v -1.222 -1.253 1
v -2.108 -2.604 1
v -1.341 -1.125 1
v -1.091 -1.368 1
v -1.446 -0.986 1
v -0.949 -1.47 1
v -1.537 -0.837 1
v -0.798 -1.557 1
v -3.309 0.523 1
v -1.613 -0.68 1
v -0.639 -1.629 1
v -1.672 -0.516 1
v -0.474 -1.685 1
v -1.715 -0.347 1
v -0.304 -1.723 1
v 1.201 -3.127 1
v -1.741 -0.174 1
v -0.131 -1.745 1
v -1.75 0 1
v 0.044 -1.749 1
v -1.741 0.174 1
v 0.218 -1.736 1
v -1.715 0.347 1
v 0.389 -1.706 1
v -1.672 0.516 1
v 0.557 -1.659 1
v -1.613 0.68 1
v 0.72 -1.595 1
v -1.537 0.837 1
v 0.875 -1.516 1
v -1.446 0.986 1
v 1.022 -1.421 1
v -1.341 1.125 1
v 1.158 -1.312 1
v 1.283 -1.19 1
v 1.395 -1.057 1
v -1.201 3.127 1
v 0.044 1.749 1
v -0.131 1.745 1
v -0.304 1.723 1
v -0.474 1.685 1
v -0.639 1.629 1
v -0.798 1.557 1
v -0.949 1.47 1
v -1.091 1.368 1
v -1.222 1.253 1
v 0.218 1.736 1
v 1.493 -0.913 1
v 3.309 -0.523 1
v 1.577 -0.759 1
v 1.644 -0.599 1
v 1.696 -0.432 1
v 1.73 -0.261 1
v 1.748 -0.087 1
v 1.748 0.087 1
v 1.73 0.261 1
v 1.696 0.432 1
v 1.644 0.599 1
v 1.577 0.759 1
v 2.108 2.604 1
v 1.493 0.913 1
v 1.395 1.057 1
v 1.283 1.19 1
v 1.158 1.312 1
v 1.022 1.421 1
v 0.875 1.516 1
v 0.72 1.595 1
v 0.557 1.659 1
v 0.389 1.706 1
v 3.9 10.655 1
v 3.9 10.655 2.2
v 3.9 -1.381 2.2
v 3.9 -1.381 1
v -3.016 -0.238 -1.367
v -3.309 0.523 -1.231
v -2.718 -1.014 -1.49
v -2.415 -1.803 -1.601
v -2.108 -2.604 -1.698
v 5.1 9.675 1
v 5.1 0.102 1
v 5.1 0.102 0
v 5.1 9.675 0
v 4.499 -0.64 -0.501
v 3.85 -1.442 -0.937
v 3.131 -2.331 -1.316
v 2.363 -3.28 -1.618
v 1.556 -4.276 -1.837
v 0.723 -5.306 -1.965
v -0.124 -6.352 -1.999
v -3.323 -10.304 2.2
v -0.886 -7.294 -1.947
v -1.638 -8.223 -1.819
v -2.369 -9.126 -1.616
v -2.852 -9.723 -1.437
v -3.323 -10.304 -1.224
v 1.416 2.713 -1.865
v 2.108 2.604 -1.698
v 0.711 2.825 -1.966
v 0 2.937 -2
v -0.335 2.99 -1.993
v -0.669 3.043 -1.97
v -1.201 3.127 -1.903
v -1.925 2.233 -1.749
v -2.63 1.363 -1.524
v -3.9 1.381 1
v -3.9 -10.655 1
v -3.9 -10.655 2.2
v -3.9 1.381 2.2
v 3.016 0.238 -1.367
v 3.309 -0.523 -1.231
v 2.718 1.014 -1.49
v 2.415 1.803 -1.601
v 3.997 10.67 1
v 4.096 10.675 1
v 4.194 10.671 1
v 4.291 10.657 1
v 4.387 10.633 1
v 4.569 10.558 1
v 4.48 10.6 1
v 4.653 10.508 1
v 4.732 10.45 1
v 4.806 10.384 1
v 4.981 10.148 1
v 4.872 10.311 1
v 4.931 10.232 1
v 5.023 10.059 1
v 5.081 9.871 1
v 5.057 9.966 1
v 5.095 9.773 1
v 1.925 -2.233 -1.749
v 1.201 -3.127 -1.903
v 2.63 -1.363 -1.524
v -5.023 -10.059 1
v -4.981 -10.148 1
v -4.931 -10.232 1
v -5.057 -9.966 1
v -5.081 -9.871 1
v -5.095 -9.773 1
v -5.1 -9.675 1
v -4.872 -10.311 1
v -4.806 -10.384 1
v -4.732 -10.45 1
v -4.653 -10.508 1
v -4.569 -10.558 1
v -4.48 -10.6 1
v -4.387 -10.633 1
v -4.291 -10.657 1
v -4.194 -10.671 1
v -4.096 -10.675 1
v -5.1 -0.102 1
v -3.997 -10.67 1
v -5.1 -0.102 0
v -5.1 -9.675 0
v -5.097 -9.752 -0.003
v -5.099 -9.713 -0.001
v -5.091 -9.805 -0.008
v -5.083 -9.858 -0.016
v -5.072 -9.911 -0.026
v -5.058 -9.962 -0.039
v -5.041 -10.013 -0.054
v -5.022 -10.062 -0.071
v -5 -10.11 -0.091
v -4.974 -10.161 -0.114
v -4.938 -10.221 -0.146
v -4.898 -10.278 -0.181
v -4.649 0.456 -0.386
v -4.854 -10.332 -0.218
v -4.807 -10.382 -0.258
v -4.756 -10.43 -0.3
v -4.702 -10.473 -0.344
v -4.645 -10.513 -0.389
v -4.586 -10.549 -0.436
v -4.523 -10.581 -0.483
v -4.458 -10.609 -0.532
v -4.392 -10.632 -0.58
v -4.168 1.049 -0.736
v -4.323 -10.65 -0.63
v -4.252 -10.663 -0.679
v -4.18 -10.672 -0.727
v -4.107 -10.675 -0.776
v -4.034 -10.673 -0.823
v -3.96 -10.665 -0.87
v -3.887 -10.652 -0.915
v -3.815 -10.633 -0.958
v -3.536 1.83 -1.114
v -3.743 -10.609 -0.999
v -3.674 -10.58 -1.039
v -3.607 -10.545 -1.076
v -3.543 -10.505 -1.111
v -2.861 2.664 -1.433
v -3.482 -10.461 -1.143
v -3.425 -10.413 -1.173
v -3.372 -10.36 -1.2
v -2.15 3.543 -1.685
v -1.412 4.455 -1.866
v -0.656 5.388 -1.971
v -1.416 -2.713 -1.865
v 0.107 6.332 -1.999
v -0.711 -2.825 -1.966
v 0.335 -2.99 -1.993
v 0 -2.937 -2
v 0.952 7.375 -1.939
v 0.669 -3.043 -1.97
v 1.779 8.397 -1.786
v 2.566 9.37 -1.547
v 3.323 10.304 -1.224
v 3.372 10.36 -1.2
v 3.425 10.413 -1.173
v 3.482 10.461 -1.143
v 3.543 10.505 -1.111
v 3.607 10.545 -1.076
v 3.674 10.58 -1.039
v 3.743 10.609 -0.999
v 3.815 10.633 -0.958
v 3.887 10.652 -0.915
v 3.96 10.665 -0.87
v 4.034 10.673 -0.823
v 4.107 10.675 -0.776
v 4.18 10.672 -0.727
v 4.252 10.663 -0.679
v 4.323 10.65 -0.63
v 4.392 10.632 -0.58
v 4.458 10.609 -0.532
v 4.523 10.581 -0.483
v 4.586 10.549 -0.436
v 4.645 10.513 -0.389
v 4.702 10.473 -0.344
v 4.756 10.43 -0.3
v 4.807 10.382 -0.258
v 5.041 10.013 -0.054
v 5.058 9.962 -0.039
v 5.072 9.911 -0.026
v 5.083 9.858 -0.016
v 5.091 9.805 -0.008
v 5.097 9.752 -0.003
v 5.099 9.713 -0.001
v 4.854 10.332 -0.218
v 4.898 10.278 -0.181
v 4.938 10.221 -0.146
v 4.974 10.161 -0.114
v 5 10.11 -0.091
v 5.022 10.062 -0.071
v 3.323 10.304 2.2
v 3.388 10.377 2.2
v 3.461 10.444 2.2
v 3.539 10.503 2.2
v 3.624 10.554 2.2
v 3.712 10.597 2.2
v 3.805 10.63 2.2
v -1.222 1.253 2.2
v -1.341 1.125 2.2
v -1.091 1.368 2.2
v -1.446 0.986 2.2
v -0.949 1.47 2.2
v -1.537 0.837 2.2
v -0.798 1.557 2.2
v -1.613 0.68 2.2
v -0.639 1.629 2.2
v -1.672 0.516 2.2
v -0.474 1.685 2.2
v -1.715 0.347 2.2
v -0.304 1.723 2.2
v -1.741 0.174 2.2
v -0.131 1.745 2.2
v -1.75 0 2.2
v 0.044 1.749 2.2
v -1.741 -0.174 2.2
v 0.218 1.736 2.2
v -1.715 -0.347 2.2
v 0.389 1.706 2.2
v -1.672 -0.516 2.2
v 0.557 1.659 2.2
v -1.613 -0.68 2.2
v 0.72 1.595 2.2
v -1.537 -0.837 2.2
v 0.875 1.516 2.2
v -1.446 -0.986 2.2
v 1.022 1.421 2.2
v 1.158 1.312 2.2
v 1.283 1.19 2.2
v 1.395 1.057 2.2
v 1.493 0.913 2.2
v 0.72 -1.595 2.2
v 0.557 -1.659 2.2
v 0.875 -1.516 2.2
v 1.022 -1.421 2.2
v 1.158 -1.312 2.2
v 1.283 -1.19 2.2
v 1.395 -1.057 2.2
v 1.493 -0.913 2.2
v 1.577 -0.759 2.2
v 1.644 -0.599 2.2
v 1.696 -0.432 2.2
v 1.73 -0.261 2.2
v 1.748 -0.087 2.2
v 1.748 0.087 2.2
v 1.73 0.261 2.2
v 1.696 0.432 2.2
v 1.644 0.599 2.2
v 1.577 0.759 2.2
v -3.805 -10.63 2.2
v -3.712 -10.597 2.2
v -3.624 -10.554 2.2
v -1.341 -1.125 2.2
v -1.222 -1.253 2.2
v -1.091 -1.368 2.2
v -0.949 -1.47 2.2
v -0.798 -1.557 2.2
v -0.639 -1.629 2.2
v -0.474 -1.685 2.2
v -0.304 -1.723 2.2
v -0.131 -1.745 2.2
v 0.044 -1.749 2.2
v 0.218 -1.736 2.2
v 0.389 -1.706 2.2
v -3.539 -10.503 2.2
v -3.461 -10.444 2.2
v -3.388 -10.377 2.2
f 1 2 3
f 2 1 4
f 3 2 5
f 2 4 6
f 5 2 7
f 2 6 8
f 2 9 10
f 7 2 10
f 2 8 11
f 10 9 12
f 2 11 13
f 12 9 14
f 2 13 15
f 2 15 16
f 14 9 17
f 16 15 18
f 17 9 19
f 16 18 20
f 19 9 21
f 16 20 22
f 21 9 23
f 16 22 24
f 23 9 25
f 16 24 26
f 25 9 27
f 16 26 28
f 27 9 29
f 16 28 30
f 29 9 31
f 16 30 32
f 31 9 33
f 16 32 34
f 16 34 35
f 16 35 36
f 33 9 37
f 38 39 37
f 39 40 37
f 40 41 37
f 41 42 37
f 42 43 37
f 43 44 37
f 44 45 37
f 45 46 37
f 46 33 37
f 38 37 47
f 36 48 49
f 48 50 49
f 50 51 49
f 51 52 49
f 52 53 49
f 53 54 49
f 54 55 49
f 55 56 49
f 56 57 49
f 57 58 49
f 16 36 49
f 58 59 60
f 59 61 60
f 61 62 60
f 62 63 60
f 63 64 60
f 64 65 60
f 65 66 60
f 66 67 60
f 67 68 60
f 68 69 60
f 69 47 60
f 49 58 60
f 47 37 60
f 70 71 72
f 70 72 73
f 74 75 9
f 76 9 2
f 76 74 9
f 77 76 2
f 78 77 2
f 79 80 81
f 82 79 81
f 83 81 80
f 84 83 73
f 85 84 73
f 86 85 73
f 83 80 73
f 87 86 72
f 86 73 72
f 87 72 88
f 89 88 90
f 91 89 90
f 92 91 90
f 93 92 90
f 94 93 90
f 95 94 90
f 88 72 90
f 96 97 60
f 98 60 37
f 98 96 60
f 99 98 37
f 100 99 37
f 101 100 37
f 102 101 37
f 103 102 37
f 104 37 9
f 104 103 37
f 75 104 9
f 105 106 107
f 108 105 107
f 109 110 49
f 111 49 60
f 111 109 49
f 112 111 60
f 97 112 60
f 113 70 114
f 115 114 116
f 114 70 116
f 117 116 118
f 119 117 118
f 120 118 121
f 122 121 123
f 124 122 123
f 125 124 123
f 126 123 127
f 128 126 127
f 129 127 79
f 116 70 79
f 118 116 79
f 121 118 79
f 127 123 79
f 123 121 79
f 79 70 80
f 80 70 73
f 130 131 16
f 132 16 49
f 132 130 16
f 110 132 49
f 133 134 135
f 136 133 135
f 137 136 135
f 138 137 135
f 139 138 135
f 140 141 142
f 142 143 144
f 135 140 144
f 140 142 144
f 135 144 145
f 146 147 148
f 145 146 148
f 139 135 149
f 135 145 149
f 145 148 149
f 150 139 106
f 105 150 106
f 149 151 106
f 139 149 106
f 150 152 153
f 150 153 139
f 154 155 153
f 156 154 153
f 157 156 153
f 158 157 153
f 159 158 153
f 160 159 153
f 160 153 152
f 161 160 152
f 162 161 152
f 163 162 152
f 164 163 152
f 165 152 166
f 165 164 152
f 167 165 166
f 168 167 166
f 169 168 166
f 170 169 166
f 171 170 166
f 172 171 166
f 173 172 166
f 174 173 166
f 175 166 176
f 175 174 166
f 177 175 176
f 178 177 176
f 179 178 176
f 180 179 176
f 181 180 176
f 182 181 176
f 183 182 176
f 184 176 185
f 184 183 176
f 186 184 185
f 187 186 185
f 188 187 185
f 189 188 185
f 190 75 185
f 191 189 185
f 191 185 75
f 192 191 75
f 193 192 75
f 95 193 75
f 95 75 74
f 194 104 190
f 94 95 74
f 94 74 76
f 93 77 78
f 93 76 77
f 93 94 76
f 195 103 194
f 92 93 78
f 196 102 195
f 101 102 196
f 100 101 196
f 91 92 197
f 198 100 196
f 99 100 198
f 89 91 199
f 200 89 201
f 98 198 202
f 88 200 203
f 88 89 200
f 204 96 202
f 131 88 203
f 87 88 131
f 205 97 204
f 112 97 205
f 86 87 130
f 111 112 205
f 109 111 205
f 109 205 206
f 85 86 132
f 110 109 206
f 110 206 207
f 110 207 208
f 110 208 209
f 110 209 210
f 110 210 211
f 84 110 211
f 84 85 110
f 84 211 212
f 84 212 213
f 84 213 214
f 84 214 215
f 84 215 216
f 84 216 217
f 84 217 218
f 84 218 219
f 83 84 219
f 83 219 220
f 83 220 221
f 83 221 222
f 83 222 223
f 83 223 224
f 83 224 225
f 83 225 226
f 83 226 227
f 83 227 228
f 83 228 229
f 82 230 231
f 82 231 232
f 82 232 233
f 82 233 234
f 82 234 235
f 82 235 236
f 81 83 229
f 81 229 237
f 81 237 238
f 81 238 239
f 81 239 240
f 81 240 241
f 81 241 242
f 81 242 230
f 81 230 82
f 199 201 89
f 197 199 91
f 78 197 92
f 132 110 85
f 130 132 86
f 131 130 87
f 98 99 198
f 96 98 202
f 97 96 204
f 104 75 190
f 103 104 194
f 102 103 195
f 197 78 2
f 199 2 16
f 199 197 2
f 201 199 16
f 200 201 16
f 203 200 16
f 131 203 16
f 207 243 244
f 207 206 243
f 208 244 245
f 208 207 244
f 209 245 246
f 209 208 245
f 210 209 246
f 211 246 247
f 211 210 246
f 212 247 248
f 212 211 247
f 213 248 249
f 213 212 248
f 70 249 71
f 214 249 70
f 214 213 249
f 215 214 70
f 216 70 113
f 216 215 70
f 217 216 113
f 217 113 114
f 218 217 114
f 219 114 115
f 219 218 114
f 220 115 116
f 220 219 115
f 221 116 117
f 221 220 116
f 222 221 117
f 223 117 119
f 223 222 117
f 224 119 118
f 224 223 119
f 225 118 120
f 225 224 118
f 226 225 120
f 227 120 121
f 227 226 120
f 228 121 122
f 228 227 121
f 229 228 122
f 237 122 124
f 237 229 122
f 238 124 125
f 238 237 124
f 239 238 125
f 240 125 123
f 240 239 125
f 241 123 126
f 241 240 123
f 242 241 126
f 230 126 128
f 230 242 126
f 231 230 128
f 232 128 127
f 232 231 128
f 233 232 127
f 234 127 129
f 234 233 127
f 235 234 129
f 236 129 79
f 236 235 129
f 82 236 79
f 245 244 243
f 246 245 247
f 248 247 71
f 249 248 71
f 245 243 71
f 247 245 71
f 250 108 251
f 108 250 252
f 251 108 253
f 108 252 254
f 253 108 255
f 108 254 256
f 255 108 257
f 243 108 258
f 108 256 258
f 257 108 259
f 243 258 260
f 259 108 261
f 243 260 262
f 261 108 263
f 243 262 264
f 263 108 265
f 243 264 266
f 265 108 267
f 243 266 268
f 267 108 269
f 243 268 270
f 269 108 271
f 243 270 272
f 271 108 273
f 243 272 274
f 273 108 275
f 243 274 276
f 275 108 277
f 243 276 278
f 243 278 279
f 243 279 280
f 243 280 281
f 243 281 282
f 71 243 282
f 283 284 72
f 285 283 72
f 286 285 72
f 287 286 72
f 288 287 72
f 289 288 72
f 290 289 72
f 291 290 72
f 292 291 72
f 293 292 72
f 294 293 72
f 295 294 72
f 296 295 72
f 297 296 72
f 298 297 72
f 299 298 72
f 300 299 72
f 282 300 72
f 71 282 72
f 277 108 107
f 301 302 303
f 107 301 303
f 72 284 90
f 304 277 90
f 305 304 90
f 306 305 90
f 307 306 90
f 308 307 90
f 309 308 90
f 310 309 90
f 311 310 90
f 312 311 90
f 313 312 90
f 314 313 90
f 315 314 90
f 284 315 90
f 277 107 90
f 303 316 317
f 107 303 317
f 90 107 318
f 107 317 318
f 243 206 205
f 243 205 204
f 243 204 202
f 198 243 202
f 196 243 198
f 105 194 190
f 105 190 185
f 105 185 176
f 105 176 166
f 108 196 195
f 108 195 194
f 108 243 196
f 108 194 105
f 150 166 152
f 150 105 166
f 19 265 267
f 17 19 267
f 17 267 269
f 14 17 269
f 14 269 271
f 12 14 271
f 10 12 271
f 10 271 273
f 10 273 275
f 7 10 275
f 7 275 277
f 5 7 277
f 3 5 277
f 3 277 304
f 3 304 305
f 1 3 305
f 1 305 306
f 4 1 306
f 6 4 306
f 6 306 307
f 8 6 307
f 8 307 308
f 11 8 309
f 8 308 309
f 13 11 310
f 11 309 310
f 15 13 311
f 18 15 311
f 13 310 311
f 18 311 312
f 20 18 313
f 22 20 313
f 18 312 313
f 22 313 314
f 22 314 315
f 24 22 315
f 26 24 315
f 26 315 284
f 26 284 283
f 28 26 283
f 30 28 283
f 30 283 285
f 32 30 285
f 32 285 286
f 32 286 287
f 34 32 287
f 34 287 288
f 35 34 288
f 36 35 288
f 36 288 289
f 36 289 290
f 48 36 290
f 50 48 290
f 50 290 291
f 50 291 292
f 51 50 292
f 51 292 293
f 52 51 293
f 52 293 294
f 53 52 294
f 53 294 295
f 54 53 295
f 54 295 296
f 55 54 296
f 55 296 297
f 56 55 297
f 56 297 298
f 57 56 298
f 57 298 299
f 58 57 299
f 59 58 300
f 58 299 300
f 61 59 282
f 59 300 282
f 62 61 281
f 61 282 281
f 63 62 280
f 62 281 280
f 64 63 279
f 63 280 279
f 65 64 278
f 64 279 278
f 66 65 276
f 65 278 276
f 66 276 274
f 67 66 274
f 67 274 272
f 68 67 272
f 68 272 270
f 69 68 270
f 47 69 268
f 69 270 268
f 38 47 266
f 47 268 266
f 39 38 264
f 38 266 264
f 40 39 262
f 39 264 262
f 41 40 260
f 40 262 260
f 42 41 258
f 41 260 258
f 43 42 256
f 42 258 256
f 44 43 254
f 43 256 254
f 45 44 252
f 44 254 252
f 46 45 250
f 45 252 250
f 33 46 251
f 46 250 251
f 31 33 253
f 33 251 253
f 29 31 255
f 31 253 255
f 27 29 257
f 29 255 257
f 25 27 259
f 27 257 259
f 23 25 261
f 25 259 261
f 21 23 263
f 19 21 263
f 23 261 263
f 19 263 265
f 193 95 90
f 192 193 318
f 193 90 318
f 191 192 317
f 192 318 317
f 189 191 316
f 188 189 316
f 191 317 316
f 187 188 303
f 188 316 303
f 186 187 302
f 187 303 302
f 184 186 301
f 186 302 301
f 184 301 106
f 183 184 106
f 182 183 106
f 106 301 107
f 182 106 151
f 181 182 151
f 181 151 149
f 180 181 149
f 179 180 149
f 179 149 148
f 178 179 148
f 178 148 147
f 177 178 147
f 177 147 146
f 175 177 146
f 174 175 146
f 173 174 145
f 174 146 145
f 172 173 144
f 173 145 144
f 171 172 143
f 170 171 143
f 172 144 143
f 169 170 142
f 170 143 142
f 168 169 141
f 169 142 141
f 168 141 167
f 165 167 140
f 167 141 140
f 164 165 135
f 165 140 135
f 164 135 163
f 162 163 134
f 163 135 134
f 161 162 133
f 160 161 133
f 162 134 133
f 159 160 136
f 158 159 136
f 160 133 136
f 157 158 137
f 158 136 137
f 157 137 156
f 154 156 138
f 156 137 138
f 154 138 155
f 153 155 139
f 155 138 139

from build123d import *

# Parameters (mm, degrees)
PAD_DEPTH       = 12.5
POCKET_DEPTH    = 4.201
SKETCH003_R     = 1.75
POCKET001_DEPTH = 4.201
POCKET002_DEPTH = 3
FILLET_R        = 1


with BuildPart() as part:
    # Sketch → Pad (new body, symmetric)
    with BuildSketch(Plane.XZ):
        with BuildLine():
            Line((-3.9, 2.2), (3.9, 2.2))
            Line((3.9, 2.2), (3.9, 1))
            Line((3.9, 1), (5.1, 1))
            Line((5.1, 1), (5.1, 0))
            ThreePointArc((-5.1, 0), (0, -2), (5.1, 0))
            Line((-5.1, 0), (-5.1, 1))
            Line((-5.1, 1), (-3.9, 1))
            Line((-3.9, 1), (-3.9, 2.2))
        make_face()
    extrude(amount=PAD_DEPTH, both=True)

    # Sketch002 (on Face4 of Pad) → Pocket (cut, through all)
    with BuildSketch(Plane(origin=(0, 0, 2.2), x_dir=(-1, 0, 0), z_dir=(0, 0, 1))):
        Polygon((-5.1, -0.102052), (5.1, 12.5), (-5.1, 12.5), align=None)
        Polygon((-5.1, -12.5), (5.1, 0.102052), (5.1, -12.5), align=None)
    extrude(amount=-POCKET_DEPTH, mode=Mode.SUBTRACT)

    # Sketch003 (on Face8 of Pocket) → Pocket001 (cut, through all)
    with BuildSketch(Plane(origin=(0, 0, 2.2), x_dir=(-1, 0, 0), z_dir=(0, 0, 1))):
        Circle(SKETCH003_R)
    extrude(amount=-POCKET001_DEPTH, mode=Mode.SUBTRACT)

    # Sketch004 (on DatumPlane) → Pocket002 (cut)
    with BuildSketch(Plane.XY.offset(-2)):
        Polygon((3.308847, -0.523478), (2.107769, 2.603807), (-1.201078, 3.127285), (-3.308847, 0.523478), (-2.107769, -2.603807), (1.201078, -3.127285), align=None)
    extrude(amount=POCKET002_DEPTH, mode=Mode.SUBTRACT)

    # Fillet
    fillet_edges = [part.edges().sort_by_distance(p)[0] for p in [
        (5.1, 12.5, 0.5),
        (-5.1, -12.5, 0.5),
    ]]
    fillet(fillet_edges, radius=FILLET_R)


solid = part.part
